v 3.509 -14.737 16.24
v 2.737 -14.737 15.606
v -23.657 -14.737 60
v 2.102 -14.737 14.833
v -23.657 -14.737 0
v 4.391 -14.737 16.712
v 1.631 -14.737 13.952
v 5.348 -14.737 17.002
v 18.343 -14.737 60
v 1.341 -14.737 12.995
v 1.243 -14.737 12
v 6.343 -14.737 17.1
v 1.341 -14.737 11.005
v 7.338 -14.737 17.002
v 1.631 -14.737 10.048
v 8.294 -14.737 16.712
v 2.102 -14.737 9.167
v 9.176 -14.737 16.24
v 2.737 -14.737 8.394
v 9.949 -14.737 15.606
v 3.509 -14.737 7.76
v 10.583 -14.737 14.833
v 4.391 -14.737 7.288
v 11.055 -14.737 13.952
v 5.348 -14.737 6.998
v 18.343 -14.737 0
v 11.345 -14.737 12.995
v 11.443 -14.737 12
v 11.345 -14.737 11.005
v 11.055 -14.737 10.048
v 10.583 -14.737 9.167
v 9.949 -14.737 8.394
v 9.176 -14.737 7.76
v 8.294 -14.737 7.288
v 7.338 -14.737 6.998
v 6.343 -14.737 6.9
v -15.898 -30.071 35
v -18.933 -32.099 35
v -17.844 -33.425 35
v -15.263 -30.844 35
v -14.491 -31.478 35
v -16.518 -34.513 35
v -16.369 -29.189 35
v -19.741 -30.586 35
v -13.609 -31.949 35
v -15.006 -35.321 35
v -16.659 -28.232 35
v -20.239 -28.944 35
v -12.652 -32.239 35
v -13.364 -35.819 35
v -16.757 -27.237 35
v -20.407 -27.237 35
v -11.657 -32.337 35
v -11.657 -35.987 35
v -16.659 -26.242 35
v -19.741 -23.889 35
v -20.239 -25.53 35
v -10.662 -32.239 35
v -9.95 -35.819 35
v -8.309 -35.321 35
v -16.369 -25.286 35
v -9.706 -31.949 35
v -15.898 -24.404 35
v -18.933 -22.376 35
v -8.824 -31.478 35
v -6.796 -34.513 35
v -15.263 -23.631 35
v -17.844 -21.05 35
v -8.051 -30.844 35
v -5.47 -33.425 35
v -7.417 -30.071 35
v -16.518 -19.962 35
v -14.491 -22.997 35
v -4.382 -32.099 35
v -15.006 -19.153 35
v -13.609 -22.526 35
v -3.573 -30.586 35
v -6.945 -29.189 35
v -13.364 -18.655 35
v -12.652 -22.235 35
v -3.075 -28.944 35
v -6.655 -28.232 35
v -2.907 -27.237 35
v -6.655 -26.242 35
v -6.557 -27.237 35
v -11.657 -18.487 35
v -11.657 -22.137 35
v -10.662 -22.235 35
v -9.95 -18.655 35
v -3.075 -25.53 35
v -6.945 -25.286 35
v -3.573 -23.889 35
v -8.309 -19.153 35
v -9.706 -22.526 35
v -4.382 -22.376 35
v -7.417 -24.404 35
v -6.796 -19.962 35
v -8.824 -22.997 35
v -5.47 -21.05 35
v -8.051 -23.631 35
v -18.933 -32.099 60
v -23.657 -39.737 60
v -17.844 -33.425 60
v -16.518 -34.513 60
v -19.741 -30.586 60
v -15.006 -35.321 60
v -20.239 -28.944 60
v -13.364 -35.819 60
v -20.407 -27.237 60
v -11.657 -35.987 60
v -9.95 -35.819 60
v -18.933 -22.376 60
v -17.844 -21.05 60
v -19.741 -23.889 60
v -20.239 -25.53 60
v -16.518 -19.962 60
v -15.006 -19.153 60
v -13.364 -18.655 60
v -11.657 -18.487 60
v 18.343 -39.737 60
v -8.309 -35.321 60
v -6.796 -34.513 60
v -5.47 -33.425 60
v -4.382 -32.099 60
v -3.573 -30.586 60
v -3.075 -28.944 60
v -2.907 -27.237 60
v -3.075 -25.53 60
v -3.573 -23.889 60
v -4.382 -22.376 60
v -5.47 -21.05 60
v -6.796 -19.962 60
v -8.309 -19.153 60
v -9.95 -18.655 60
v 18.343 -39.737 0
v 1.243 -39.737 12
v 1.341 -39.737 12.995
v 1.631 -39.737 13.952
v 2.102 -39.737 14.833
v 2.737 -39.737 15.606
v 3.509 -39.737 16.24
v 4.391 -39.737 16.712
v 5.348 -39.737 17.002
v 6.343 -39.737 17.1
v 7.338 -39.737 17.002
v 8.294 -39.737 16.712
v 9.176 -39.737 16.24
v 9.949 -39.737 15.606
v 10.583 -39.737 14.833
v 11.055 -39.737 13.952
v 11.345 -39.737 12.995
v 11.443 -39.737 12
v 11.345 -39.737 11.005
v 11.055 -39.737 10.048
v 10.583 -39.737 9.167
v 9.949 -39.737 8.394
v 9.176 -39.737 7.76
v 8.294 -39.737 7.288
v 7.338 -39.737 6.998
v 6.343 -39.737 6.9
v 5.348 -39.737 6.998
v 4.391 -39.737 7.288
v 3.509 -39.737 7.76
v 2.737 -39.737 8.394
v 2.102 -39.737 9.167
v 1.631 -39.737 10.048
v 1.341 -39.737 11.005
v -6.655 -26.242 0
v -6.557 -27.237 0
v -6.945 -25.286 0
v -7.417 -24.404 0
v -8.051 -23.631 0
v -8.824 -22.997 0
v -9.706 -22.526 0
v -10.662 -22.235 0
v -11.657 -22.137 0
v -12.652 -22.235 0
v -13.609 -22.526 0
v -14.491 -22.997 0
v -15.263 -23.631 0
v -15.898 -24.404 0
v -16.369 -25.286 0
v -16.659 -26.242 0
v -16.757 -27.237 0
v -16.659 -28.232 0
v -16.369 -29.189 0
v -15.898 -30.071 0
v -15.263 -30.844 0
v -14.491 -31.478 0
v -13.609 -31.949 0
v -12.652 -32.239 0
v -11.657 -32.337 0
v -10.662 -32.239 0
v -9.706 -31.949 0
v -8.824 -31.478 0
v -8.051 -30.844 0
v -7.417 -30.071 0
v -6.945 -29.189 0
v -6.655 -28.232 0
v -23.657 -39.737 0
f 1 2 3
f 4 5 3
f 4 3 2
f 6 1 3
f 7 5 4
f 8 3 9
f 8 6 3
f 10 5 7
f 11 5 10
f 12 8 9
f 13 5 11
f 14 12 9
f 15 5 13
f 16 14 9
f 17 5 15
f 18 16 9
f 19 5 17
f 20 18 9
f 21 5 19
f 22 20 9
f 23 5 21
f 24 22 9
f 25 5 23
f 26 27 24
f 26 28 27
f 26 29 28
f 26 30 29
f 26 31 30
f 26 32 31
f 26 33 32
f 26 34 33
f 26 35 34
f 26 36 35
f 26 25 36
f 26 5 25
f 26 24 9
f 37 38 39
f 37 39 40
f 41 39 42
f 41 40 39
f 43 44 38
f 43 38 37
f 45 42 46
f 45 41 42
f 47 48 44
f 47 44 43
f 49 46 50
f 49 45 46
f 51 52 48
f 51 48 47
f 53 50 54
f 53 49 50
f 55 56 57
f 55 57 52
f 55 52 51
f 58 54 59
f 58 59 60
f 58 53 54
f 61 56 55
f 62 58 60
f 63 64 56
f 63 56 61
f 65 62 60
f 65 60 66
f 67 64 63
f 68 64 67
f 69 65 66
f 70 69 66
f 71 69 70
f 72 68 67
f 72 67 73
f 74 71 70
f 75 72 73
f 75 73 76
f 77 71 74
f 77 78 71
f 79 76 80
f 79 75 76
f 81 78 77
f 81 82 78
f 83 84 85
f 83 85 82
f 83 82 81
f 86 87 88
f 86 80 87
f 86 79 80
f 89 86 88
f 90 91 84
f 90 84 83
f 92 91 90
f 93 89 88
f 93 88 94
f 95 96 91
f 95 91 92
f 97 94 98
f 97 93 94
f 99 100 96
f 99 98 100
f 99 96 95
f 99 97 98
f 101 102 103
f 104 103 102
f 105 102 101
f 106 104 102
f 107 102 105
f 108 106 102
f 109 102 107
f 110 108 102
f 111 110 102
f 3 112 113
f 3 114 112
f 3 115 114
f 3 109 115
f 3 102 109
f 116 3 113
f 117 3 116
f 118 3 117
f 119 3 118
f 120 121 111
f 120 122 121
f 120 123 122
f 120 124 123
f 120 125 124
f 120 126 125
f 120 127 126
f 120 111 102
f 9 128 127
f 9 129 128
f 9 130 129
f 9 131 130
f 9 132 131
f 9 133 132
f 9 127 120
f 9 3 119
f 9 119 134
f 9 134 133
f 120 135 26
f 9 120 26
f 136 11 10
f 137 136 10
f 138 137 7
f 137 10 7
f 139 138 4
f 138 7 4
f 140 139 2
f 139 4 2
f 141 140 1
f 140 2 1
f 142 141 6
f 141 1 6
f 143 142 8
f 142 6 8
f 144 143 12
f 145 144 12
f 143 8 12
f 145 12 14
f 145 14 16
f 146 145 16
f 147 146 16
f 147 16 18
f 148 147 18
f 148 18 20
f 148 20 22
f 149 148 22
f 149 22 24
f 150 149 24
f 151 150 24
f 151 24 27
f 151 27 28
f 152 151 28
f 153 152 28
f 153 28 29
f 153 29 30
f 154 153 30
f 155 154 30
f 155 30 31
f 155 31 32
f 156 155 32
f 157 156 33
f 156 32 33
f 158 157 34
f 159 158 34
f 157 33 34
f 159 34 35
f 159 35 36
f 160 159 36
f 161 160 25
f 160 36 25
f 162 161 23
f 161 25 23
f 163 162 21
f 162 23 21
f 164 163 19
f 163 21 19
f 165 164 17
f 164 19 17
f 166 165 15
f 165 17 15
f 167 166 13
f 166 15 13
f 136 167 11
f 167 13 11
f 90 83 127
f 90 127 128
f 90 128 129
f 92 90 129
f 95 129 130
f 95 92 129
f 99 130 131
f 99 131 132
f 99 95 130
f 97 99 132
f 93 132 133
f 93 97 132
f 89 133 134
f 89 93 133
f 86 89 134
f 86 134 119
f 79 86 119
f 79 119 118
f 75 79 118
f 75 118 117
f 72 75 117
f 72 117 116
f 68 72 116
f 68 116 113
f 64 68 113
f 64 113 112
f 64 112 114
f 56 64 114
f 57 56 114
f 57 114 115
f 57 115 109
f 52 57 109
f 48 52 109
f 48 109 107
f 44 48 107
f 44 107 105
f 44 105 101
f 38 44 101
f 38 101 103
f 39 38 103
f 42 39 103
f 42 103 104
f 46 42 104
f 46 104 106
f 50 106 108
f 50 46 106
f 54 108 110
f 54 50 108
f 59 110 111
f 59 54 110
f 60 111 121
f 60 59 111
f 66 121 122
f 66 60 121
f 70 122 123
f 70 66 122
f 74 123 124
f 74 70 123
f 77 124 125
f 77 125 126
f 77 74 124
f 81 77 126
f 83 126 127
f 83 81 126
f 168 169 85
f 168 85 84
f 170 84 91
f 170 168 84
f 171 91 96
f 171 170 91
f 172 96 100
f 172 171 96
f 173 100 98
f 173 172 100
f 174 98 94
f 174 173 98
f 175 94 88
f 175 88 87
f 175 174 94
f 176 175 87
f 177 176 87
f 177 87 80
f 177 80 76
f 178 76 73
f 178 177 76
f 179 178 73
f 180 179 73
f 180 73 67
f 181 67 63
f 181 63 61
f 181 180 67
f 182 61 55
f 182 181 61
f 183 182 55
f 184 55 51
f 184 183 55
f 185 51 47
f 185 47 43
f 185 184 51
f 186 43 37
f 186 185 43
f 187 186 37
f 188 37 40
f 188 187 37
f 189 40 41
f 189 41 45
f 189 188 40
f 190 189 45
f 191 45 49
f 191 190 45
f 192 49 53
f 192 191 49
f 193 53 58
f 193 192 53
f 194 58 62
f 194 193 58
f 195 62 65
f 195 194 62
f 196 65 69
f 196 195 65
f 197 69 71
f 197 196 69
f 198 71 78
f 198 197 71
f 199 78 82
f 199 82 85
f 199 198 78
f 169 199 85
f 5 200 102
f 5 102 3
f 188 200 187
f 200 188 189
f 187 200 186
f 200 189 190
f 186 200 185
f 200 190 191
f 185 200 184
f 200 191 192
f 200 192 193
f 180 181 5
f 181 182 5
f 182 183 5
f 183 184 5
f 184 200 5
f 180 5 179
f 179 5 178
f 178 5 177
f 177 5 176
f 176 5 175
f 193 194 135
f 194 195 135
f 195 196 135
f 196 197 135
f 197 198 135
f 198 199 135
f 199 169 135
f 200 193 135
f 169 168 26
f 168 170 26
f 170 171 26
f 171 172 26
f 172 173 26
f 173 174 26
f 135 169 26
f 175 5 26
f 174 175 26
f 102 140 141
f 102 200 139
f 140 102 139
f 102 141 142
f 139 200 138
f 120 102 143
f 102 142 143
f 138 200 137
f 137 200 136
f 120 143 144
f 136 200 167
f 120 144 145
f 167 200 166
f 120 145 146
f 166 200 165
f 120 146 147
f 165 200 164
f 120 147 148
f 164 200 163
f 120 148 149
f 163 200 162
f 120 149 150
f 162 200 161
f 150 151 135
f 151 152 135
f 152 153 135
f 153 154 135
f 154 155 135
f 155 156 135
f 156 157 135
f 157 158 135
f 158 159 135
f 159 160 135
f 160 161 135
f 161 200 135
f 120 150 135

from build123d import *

# Parameters (mm, degrees)
F0_W     = 42
F0_H     = 25
F0_R     = 8.75
F1_DEPTH = 60
F0_R_2   = 5.1
F2_DEPTH = 35
F3_R     = 5.1
F4_DEPTH = 47.6


with BuildPart() as f1:
    # F0 (on Top) → F1 (new body)
    with BuildSketch(Plane.XY):
        with Locations((-2.65721, -27.237348)):
            Rectangle(F0_W, F0_H)
        with Locations((-11.65721, -27.237348)):
            Circle(F0_R, mode=Mode.SUBTRACT)
    extrude(amount=F1_DEPTH)

    # F0 (on Top) → F2 (join)
    with BuildSketch(Plane.XY):
        with Locations((-11.65721, -27.237348)):
            Circle(F0_R)
        with Locations((-11.65721, -27.237348)):
            Circle(F0_R_2, mode=Mode.SUBTRACT)
    extrude(amount=F2_DEPTH)

    # F3 (on face) → F4 (cut)
    with BuildSketch(Plane(origin=(0, -14.737348, 0), x_dir=(-1, 0, 0), z_dir=(0, 1, 0))):
        with Locations((-6.34279, 12)):
            Circle(F3_R)
    extrude(amount=-F4_DEPTH, mode=Mode.SUBTRACT)


solid = f1.part
